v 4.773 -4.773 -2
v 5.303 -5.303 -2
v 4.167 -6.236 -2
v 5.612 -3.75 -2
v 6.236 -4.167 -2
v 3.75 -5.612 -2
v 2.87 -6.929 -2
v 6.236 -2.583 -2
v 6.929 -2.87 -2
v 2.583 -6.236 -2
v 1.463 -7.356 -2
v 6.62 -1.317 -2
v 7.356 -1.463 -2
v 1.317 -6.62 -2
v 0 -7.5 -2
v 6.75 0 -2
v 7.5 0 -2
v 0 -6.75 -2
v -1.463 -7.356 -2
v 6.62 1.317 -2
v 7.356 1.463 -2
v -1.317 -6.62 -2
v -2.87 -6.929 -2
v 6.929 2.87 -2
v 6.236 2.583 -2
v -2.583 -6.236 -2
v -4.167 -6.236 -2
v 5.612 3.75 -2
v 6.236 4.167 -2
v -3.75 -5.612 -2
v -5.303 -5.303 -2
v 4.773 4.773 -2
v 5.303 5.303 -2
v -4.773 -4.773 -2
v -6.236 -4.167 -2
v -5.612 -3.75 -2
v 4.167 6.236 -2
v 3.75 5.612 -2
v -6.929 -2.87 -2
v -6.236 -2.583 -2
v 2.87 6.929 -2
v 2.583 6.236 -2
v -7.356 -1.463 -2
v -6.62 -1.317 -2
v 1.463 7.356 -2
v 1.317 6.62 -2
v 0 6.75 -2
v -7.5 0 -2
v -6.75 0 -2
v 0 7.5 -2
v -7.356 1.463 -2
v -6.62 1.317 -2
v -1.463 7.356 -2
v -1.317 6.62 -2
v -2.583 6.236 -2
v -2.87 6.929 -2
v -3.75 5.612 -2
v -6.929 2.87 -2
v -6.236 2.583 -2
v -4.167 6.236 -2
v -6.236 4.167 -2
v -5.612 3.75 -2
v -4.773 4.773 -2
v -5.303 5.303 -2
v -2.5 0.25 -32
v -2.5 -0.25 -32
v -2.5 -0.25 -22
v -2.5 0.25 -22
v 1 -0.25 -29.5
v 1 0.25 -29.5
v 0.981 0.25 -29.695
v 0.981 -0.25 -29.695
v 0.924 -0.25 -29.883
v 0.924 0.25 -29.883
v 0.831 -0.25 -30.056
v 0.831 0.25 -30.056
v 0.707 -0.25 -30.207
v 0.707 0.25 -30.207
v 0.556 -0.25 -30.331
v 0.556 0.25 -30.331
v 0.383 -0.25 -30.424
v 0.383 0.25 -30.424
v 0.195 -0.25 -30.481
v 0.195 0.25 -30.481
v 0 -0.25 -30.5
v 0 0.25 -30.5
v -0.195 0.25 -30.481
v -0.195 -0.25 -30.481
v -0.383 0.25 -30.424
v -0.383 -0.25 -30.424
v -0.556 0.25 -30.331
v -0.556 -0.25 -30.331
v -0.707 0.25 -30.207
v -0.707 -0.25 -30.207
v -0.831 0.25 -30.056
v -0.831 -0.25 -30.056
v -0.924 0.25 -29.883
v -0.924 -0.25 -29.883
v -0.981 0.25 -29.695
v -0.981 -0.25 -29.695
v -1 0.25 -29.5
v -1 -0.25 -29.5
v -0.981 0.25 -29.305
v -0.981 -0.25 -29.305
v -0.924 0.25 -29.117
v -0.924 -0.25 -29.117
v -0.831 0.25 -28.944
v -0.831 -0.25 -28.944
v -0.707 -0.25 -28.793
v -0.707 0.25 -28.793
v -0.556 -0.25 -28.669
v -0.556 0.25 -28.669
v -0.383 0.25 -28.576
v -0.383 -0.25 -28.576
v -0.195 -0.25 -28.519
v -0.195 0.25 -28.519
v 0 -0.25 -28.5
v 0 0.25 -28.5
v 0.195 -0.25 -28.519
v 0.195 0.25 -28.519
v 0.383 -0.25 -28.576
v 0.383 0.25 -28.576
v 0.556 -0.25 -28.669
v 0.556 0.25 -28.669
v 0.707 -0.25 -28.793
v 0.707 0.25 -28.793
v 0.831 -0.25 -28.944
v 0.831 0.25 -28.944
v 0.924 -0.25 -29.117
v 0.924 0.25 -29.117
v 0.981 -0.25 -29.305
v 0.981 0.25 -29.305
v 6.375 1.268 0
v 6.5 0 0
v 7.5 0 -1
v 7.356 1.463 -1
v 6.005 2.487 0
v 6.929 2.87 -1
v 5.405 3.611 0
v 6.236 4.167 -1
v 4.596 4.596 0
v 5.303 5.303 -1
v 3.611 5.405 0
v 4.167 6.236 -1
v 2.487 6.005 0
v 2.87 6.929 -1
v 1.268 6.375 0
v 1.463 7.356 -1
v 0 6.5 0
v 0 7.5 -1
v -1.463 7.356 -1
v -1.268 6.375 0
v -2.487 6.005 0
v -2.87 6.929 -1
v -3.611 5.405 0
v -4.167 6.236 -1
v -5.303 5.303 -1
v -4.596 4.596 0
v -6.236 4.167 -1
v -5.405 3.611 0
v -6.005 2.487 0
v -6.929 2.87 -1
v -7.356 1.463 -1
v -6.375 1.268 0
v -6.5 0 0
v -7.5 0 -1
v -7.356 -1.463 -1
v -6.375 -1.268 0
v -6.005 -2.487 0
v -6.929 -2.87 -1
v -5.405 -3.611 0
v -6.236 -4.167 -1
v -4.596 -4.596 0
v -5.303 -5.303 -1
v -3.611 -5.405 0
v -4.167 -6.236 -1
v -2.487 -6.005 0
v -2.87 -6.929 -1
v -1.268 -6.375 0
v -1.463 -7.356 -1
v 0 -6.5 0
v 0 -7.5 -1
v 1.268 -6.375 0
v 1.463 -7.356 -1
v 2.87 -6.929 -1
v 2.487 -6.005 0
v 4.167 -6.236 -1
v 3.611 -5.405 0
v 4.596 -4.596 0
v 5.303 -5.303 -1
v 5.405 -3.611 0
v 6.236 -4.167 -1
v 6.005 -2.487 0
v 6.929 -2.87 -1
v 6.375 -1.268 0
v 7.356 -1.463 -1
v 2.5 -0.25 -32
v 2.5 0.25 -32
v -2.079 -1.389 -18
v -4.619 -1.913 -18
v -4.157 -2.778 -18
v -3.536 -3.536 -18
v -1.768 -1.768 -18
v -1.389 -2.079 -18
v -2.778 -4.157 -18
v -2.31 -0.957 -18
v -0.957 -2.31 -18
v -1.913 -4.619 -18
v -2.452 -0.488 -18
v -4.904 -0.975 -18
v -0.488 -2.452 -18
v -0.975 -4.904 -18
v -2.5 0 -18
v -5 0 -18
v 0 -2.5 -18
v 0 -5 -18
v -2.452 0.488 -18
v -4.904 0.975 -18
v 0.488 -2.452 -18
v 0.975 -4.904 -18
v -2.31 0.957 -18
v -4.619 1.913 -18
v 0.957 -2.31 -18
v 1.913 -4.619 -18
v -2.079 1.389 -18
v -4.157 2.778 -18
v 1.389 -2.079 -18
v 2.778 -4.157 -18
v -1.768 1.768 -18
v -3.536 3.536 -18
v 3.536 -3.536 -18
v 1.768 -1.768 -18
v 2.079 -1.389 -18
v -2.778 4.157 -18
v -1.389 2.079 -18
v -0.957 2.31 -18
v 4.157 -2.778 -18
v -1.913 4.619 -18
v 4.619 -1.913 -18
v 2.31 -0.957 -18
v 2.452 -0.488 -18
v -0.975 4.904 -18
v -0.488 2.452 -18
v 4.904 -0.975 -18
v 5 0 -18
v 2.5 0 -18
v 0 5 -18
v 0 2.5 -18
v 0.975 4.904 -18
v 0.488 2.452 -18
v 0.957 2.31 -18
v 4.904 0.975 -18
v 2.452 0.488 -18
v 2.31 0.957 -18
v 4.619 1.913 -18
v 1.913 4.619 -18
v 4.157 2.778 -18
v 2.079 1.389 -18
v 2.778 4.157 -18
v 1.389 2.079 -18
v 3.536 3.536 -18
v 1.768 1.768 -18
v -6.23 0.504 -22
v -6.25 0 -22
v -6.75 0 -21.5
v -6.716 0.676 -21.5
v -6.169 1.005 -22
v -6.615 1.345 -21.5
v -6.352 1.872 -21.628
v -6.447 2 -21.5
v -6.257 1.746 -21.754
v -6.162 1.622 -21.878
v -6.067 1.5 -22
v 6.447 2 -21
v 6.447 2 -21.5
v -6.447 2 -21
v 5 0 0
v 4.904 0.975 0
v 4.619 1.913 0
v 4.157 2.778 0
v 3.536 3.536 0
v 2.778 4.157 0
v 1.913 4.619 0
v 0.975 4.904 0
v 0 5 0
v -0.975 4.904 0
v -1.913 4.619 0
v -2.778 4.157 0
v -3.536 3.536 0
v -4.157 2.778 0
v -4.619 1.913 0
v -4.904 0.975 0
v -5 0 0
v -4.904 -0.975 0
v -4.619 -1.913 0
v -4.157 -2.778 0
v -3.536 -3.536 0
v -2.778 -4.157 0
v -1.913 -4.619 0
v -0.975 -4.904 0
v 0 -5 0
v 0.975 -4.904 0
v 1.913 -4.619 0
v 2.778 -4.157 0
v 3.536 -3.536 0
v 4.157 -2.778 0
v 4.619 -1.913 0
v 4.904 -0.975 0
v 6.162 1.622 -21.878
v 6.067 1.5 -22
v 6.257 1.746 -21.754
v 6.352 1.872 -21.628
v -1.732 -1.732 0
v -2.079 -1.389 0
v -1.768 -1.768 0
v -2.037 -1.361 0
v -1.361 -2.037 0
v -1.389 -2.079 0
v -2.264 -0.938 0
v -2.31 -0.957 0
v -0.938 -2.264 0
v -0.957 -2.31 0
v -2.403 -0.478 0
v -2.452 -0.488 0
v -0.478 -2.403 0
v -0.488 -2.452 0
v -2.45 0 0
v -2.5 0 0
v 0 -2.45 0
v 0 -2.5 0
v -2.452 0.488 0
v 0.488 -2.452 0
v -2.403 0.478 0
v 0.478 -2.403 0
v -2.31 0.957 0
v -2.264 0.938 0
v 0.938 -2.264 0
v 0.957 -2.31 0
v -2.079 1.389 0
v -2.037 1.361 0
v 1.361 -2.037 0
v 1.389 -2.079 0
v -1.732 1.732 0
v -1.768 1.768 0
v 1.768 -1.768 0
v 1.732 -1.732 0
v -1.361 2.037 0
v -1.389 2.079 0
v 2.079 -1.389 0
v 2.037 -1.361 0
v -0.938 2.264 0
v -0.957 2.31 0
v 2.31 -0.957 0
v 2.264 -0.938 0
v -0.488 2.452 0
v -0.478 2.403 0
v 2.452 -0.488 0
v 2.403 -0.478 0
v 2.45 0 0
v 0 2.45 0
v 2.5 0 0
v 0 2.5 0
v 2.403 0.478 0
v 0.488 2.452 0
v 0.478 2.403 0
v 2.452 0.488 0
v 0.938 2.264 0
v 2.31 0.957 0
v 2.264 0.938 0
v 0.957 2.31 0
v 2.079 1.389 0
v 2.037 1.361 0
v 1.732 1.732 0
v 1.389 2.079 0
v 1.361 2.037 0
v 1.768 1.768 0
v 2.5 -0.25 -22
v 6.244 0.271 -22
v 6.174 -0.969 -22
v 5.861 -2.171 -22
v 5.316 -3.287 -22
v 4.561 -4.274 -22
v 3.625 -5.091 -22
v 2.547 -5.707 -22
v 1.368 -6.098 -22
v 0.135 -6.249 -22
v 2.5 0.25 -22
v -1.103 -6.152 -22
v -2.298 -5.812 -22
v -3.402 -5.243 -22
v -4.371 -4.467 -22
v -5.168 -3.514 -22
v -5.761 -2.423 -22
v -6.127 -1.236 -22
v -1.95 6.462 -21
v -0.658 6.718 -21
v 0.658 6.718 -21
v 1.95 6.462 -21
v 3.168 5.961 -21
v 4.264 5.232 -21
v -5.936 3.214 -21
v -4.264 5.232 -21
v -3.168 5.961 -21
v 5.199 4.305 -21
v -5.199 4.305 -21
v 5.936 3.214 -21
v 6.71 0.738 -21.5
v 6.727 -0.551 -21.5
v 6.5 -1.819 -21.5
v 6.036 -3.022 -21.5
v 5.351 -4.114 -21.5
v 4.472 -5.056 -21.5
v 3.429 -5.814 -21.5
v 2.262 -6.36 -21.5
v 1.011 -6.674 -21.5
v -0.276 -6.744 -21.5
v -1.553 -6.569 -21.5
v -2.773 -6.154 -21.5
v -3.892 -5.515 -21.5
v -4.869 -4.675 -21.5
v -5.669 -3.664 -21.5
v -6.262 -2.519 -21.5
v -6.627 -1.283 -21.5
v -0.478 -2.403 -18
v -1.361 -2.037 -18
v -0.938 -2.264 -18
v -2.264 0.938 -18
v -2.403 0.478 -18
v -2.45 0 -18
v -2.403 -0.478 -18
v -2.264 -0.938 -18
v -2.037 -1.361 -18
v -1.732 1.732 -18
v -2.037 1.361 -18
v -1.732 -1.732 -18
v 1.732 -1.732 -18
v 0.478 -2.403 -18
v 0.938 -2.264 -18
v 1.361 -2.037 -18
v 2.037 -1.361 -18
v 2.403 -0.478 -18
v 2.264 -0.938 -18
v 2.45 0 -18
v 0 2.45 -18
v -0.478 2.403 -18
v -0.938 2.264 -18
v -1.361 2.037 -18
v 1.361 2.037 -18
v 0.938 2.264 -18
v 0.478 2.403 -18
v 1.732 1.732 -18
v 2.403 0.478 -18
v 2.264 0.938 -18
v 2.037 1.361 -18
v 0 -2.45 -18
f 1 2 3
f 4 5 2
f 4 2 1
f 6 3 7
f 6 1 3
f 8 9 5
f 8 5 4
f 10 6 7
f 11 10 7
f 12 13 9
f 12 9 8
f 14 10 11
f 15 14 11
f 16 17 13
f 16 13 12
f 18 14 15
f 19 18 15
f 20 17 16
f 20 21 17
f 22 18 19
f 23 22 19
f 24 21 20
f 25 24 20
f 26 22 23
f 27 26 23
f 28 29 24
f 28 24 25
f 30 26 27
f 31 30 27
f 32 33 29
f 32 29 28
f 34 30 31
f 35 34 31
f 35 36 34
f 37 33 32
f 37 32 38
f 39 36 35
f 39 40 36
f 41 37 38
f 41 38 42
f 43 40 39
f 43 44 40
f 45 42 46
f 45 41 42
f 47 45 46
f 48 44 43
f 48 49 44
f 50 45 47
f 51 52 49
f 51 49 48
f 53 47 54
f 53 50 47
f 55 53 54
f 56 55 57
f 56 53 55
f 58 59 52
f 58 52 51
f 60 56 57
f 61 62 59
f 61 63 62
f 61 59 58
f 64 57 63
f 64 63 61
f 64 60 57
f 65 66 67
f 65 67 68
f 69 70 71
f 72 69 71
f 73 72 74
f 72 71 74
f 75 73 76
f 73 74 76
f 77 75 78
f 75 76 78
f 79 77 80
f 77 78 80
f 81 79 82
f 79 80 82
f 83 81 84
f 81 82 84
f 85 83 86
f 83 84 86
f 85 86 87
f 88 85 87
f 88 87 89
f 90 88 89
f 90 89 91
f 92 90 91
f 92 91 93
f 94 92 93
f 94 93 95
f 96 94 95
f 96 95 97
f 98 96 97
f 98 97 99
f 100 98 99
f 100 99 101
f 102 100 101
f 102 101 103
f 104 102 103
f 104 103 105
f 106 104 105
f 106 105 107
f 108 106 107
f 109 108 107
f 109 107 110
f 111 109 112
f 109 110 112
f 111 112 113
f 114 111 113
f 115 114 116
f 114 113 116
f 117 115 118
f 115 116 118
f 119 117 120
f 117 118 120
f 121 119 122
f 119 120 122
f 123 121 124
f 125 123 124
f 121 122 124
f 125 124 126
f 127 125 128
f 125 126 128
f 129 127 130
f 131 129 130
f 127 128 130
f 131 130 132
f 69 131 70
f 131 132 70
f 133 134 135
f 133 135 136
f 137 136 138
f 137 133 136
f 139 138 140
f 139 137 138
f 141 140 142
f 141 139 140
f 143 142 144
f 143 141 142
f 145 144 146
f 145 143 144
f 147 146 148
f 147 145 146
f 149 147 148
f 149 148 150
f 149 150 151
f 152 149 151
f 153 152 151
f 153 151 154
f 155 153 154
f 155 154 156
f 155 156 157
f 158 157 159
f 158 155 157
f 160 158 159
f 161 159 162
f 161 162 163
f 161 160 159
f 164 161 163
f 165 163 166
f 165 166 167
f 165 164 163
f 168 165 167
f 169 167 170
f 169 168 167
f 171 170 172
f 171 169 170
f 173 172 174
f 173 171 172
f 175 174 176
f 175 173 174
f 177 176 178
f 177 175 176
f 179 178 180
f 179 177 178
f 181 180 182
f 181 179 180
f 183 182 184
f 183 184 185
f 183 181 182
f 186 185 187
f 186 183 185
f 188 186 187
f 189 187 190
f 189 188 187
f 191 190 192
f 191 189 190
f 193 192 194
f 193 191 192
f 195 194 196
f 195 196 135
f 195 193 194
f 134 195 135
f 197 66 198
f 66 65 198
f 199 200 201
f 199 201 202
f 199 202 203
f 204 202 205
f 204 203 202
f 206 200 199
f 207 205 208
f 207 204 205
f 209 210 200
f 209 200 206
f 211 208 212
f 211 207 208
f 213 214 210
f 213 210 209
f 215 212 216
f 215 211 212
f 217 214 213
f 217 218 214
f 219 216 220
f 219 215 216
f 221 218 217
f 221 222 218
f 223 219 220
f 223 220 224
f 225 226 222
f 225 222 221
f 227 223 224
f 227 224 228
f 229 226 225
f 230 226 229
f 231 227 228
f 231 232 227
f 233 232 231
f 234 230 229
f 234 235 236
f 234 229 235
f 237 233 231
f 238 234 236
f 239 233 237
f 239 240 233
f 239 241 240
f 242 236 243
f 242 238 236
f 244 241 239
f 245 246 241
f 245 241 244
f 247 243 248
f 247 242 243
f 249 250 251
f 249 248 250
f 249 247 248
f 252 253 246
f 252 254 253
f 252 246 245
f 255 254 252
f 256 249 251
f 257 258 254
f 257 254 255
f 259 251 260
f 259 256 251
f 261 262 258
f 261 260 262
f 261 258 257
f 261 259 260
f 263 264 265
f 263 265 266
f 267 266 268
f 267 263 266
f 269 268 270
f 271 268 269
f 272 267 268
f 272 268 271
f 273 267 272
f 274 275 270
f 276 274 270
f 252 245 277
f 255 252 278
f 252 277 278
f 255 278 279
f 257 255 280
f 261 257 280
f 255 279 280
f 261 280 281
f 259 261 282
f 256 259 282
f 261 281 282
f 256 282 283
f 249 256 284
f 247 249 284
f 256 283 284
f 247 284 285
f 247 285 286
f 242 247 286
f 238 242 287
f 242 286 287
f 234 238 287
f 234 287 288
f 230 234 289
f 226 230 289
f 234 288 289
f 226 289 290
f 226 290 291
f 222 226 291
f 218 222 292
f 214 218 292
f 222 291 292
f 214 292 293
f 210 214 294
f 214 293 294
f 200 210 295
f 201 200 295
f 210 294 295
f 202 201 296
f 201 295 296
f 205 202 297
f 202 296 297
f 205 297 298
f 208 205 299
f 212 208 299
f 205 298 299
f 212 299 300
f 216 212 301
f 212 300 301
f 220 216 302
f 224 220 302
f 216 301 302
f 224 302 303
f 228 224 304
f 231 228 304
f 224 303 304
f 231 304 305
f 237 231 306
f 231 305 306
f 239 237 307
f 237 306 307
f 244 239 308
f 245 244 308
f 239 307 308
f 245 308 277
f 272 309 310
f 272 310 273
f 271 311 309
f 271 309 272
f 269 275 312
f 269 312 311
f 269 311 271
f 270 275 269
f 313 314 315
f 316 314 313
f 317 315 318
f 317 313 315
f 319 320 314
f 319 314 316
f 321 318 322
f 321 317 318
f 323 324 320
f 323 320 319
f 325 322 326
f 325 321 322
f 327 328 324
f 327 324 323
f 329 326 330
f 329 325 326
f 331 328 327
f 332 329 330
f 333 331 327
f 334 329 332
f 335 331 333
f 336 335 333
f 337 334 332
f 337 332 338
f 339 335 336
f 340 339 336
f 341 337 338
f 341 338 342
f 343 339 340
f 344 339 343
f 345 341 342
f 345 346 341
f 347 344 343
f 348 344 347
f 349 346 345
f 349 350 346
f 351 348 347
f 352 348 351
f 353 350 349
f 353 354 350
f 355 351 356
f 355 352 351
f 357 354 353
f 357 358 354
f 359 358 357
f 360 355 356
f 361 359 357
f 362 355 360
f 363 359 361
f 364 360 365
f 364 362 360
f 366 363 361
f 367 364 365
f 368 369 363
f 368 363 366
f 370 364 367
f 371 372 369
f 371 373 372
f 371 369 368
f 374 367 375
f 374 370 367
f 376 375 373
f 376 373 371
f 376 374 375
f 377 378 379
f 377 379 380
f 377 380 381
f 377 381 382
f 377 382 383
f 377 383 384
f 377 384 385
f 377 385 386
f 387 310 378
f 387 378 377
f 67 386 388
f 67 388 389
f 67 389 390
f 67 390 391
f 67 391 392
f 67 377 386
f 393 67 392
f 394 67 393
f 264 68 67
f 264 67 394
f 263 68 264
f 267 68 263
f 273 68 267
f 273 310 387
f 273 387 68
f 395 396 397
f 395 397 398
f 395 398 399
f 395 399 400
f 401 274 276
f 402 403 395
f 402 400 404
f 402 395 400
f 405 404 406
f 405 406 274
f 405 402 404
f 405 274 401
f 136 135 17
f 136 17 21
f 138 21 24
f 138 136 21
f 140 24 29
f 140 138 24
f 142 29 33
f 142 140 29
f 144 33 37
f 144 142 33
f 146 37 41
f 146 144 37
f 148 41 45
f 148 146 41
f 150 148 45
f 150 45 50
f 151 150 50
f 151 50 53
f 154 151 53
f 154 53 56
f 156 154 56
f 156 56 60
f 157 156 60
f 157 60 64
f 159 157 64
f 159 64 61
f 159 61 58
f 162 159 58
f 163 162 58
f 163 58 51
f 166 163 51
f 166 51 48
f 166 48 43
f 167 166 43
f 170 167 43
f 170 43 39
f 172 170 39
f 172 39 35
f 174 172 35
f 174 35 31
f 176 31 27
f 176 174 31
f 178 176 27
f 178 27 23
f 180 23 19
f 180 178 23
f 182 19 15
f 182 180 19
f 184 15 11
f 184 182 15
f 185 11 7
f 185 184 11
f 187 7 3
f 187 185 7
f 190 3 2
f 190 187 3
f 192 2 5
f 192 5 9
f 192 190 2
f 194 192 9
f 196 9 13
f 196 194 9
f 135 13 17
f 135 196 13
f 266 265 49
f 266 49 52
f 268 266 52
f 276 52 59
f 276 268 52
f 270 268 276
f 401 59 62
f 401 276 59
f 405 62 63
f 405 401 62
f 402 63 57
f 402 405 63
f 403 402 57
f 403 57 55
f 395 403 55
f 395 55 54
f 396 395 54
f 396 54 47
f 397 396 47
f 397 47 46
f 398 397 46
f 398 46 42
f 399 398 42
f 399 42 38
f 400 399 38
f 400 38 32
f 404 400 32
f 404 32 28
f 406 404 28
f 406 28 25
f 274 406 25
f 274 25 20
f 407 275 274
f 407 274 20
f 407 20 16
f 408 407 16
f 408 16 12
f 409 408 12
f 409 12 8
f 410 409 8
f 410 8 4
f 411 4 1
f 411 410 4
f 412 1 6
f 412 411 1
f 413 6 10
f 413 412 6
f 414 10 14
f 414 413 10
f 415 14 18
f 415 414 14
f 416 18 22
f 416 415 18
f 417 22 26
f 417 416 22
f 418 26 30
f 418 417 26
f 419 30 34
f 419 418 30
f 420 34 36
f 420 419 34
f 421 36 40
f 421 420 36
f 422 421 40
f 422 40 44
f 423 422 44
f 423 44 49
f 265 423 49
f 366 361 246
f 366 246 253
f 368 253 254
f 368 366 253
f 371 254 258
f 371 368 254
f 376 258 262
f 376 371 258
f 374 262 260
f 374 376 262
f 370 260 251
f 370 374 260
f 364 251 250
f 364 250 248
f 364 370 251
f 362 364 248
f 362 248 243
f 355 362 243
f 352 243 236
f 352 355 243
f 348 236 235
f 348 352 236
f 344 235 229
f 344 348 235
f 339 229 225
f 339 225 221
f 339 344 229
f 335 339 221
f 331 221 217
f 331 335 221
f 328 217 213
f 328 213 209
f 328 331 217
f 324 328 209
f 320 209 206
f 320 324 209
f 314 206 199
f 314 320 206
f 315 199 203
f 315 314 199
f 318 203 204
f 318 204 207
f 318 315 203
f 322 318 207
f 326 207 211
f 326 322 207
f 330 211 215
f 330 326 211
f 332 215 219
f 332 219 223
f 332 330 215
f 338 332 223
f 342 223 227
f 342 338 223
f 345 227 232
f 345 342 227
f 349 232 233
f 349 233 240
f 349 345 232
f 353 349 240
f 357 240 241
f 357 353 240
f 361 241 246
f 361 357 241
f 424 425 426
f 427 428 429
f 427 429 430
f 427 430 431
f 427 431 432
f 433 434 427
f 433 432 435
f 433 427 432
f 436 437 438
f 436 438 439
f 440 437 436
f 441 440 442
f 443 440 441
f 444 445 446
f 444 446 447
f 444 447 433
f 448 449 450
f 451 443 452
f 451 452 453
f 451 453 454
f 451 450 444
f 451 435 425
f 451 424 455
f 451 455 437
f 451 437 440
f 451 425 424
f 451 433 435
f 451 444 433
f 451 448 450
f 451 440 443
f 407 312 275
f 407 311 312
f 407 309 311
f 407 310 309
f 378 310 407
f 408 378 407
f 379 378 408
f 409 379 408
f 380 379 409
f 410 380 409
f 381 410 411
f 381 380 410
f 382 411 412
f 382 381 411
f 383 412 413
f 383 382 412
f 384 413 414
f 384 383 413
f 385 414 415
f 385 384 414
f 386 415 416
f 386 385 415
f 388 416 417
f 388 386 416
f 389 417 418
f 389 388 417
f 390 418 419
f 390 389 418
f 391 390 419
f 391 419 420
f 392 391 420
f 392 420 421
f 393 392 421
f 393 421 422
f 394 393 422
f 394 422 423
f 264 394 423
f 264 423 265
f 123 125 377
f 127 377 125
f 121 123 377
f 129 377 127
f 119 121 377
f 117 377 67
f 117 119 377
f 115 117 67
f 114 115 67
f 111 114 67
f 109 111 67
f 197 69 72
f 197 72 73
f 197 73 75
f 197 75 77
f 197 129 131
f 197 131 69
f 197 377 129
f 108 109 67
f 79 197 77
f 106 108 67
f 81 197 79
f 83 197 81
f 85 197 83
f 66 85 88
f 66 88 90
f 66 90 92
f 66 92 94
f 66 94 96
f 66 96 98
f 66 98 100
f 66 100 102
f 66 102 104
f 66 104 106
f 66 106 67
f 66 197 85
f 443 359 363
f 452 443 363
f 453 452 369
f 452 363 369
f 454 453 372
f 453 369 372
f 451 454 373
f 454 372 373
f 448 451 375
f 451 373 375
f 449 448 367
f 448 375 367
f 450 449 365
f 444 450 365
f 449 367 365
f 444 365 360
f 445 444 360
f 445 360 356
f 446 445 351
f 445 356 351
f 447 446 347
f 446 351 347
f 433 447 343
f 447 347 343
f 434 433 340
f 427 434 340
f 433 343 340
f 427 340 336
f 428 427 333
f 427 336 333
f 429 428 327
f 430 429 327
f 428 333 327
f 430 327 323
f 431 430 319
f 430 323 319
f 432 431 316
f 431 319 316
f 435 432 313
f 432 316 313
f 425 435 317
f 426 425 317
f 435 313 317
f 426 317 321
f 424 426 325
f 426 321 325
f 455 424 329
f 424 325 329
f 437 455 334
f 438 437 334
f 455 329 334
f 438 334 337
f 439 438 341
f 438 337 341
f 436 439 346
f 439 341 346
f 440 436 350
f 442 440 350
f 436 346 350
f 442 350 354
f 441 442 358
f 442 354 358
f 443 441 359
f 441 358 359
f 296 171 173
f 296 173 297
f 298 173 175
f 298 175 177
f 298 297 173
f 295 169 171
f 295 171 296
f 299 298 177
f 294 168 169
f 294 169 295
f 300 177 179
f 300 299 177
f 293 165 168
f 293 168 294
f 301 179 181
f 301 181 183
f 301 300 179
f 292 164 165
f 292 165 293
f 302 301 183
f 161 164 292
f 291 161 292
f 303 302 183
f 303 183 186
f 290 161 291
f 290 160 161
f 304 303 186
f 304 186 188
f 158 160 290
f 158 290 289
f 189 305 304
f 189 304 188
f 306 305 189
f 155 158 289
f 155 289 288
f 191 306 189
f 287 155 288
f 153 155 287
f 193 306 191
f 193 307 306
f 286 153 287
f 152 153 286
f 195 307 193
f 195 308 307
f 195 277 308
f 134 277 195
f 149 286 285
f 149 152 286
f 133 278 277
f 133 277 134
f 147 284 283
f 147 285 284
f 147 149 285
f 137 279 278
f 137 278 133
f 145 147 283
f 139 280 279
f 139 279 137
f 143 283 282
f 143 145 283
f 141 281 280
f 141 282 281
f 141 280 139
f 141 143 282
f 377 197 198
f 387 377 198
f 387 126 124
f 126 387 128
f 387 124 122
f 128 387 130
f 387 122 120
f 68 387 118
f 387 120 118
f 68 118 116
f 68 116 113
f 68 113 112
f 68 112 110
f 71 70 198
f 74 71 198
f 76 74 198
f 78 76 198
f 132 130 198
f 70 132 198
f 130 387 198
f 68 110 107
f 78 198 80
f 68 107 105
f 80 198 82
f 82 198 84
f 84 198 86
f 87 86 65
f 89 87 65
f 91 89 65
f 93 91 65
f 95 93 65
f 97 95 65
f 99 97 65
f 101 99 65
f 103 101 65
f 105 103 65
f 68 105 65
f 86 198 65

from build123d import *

# Parameters (mm, degrees)
ESQUISSE1_R           = 7.5
EXTRUSION1_DEPTH      = 32
ESQUISSE2_R           = 5
ESQUISSE2_R_2         = 2.5
ESQUISSE2_R_3         = 2.45
EXTRUSION3_DEPTH      = 18
ESQUISSE3_OUTSIDE_W   = 24.678
ESQUISSE3_OUTSIDE_H   = 24.678
ESQUISSE3_OUTSIDE_R   = 6.75
EXTRUSION5_DEPTH      = 30
ESQUISSE4_OUTSIDE_W   = 24.678
ESQUISSE4_OUTSIDE_H   = 24.678
ESQUISSE4_OUTSIDE_W_2 = 5
ESQUISSE4_OUTSIDE_H_2 = 0.5
EXTRUSION6_DEPTH      = 10
ESQUISSE5_W           = 18
ESQUISSE5_H           = 6
EXTRUSION7_DEPTH      = 1
ESQUISSE6_R           = 1
EXTRUSION8_DEPTH      = 8.75
CHANFREIN1_SIZE       = 1
CHANFREIN2_SIZE       = 0.5


with BuildPart() as part:
    # Esquisse1 → Extrusion1 (new body)
    with BuildSketch(Plane.XY):
        Circle(ESQUISSE1_R)
    extrude(amount=-EXTRUSION1_DEPTH)

    # Esquisse2 → Extrusion3 (cut)
    with BuildSketch(Plane.XY):
        Circle(ESQUISSE2_R)
        Circle(ESQUISSE2_R_2, mode=Mode.SUBTRACT)
        Circle(ESQUISSE2_R_3)
    extrude(amount=-EXTRUSION3_DEPTH, mode=Mode.SUBTRACT)

    # Esquisse3 outside → Extrusion5 (cut)
    with BuildSketch(Plane(origin=(0, 0, -32), x_dir=(-1, 0, 0), z_dir=(0, 0, -1))):
        Rectangle(ESQUISSE3_OUTSIDE_W, ESQUISSE3_OUTSIDE_H)
        Circle(ESQUISSE3_OUTSIDE_R, mode=Mode.SUBTRACT)
    extrude(amount=-EXTRUSION5_DEPTH, mode=Mode.SUBTRACT)

    # Esquisse4 outside → Extrusion6 (cut)
    with BuildSketch(Plane(origin=(0, 0, -32), x_dir=(-1, 0, 0), z_dir=(0, 0, -1))):
        Rectangle(ESQUISSE4_OUTSIDE_W, ESQUISSE4_OUTSIDE_H)
        Rectangle(ESQUISSE4_OUTSIDE_W_2, ESQUISSE4_OUTSIDE_H_2, mode=Mode.SUBTRACT)
    extrude(amount=-EXTRUSION6_DEPTH, mode=Mode.SUBTRACT)

    # Esquisse5 → Extrusion7 (cut)
    with BuildSketch(Plane(origin=(0, 0, -22), x_dir=(-1, 0, 0), z_dir=(0, 0, -1))):
        with Locations((0, 5)):
            Rectangle(ESQUISSE5_W, ESQUISSE5_H)
    extrude(amount=-EXTRUSION7_DEPTH, mode=Mode.SUBTRACT)

    # Esquisse6 → Extrusion8 (cut, through all)
    with BuildSketch(Plane(origin=(0, 0.25, 0), x_dir=(1, 0, 0), z_dir=(0, 1, 0))):
        with Locations((0, 29.5)):
            Circle(ESQUISSE6_R)
    extrude(amount=-EXTRUSION8_DEPTH, mode=Mode.SUBTRACT)

    # Chanfrein1
    chanfrein1_edges = [part.edges().sort_by_distance(p)[0] for p in [
        (-7.5, 0, 0),
    ]]
    chamfer(chanfrein1_edges, length=CHANFREIN1_SIZE)

    # Chanfrein2
    chanfrein2_edges = [part.edges().sort_by_distance(p)[0] for p in [
        (1.011418624, -6.67379445, -22),
        (0, 2, -22),
    ]]
    chamfer(chanfrein2_edges, length=CHANFREIN2_SIZE)


solid = part.part
